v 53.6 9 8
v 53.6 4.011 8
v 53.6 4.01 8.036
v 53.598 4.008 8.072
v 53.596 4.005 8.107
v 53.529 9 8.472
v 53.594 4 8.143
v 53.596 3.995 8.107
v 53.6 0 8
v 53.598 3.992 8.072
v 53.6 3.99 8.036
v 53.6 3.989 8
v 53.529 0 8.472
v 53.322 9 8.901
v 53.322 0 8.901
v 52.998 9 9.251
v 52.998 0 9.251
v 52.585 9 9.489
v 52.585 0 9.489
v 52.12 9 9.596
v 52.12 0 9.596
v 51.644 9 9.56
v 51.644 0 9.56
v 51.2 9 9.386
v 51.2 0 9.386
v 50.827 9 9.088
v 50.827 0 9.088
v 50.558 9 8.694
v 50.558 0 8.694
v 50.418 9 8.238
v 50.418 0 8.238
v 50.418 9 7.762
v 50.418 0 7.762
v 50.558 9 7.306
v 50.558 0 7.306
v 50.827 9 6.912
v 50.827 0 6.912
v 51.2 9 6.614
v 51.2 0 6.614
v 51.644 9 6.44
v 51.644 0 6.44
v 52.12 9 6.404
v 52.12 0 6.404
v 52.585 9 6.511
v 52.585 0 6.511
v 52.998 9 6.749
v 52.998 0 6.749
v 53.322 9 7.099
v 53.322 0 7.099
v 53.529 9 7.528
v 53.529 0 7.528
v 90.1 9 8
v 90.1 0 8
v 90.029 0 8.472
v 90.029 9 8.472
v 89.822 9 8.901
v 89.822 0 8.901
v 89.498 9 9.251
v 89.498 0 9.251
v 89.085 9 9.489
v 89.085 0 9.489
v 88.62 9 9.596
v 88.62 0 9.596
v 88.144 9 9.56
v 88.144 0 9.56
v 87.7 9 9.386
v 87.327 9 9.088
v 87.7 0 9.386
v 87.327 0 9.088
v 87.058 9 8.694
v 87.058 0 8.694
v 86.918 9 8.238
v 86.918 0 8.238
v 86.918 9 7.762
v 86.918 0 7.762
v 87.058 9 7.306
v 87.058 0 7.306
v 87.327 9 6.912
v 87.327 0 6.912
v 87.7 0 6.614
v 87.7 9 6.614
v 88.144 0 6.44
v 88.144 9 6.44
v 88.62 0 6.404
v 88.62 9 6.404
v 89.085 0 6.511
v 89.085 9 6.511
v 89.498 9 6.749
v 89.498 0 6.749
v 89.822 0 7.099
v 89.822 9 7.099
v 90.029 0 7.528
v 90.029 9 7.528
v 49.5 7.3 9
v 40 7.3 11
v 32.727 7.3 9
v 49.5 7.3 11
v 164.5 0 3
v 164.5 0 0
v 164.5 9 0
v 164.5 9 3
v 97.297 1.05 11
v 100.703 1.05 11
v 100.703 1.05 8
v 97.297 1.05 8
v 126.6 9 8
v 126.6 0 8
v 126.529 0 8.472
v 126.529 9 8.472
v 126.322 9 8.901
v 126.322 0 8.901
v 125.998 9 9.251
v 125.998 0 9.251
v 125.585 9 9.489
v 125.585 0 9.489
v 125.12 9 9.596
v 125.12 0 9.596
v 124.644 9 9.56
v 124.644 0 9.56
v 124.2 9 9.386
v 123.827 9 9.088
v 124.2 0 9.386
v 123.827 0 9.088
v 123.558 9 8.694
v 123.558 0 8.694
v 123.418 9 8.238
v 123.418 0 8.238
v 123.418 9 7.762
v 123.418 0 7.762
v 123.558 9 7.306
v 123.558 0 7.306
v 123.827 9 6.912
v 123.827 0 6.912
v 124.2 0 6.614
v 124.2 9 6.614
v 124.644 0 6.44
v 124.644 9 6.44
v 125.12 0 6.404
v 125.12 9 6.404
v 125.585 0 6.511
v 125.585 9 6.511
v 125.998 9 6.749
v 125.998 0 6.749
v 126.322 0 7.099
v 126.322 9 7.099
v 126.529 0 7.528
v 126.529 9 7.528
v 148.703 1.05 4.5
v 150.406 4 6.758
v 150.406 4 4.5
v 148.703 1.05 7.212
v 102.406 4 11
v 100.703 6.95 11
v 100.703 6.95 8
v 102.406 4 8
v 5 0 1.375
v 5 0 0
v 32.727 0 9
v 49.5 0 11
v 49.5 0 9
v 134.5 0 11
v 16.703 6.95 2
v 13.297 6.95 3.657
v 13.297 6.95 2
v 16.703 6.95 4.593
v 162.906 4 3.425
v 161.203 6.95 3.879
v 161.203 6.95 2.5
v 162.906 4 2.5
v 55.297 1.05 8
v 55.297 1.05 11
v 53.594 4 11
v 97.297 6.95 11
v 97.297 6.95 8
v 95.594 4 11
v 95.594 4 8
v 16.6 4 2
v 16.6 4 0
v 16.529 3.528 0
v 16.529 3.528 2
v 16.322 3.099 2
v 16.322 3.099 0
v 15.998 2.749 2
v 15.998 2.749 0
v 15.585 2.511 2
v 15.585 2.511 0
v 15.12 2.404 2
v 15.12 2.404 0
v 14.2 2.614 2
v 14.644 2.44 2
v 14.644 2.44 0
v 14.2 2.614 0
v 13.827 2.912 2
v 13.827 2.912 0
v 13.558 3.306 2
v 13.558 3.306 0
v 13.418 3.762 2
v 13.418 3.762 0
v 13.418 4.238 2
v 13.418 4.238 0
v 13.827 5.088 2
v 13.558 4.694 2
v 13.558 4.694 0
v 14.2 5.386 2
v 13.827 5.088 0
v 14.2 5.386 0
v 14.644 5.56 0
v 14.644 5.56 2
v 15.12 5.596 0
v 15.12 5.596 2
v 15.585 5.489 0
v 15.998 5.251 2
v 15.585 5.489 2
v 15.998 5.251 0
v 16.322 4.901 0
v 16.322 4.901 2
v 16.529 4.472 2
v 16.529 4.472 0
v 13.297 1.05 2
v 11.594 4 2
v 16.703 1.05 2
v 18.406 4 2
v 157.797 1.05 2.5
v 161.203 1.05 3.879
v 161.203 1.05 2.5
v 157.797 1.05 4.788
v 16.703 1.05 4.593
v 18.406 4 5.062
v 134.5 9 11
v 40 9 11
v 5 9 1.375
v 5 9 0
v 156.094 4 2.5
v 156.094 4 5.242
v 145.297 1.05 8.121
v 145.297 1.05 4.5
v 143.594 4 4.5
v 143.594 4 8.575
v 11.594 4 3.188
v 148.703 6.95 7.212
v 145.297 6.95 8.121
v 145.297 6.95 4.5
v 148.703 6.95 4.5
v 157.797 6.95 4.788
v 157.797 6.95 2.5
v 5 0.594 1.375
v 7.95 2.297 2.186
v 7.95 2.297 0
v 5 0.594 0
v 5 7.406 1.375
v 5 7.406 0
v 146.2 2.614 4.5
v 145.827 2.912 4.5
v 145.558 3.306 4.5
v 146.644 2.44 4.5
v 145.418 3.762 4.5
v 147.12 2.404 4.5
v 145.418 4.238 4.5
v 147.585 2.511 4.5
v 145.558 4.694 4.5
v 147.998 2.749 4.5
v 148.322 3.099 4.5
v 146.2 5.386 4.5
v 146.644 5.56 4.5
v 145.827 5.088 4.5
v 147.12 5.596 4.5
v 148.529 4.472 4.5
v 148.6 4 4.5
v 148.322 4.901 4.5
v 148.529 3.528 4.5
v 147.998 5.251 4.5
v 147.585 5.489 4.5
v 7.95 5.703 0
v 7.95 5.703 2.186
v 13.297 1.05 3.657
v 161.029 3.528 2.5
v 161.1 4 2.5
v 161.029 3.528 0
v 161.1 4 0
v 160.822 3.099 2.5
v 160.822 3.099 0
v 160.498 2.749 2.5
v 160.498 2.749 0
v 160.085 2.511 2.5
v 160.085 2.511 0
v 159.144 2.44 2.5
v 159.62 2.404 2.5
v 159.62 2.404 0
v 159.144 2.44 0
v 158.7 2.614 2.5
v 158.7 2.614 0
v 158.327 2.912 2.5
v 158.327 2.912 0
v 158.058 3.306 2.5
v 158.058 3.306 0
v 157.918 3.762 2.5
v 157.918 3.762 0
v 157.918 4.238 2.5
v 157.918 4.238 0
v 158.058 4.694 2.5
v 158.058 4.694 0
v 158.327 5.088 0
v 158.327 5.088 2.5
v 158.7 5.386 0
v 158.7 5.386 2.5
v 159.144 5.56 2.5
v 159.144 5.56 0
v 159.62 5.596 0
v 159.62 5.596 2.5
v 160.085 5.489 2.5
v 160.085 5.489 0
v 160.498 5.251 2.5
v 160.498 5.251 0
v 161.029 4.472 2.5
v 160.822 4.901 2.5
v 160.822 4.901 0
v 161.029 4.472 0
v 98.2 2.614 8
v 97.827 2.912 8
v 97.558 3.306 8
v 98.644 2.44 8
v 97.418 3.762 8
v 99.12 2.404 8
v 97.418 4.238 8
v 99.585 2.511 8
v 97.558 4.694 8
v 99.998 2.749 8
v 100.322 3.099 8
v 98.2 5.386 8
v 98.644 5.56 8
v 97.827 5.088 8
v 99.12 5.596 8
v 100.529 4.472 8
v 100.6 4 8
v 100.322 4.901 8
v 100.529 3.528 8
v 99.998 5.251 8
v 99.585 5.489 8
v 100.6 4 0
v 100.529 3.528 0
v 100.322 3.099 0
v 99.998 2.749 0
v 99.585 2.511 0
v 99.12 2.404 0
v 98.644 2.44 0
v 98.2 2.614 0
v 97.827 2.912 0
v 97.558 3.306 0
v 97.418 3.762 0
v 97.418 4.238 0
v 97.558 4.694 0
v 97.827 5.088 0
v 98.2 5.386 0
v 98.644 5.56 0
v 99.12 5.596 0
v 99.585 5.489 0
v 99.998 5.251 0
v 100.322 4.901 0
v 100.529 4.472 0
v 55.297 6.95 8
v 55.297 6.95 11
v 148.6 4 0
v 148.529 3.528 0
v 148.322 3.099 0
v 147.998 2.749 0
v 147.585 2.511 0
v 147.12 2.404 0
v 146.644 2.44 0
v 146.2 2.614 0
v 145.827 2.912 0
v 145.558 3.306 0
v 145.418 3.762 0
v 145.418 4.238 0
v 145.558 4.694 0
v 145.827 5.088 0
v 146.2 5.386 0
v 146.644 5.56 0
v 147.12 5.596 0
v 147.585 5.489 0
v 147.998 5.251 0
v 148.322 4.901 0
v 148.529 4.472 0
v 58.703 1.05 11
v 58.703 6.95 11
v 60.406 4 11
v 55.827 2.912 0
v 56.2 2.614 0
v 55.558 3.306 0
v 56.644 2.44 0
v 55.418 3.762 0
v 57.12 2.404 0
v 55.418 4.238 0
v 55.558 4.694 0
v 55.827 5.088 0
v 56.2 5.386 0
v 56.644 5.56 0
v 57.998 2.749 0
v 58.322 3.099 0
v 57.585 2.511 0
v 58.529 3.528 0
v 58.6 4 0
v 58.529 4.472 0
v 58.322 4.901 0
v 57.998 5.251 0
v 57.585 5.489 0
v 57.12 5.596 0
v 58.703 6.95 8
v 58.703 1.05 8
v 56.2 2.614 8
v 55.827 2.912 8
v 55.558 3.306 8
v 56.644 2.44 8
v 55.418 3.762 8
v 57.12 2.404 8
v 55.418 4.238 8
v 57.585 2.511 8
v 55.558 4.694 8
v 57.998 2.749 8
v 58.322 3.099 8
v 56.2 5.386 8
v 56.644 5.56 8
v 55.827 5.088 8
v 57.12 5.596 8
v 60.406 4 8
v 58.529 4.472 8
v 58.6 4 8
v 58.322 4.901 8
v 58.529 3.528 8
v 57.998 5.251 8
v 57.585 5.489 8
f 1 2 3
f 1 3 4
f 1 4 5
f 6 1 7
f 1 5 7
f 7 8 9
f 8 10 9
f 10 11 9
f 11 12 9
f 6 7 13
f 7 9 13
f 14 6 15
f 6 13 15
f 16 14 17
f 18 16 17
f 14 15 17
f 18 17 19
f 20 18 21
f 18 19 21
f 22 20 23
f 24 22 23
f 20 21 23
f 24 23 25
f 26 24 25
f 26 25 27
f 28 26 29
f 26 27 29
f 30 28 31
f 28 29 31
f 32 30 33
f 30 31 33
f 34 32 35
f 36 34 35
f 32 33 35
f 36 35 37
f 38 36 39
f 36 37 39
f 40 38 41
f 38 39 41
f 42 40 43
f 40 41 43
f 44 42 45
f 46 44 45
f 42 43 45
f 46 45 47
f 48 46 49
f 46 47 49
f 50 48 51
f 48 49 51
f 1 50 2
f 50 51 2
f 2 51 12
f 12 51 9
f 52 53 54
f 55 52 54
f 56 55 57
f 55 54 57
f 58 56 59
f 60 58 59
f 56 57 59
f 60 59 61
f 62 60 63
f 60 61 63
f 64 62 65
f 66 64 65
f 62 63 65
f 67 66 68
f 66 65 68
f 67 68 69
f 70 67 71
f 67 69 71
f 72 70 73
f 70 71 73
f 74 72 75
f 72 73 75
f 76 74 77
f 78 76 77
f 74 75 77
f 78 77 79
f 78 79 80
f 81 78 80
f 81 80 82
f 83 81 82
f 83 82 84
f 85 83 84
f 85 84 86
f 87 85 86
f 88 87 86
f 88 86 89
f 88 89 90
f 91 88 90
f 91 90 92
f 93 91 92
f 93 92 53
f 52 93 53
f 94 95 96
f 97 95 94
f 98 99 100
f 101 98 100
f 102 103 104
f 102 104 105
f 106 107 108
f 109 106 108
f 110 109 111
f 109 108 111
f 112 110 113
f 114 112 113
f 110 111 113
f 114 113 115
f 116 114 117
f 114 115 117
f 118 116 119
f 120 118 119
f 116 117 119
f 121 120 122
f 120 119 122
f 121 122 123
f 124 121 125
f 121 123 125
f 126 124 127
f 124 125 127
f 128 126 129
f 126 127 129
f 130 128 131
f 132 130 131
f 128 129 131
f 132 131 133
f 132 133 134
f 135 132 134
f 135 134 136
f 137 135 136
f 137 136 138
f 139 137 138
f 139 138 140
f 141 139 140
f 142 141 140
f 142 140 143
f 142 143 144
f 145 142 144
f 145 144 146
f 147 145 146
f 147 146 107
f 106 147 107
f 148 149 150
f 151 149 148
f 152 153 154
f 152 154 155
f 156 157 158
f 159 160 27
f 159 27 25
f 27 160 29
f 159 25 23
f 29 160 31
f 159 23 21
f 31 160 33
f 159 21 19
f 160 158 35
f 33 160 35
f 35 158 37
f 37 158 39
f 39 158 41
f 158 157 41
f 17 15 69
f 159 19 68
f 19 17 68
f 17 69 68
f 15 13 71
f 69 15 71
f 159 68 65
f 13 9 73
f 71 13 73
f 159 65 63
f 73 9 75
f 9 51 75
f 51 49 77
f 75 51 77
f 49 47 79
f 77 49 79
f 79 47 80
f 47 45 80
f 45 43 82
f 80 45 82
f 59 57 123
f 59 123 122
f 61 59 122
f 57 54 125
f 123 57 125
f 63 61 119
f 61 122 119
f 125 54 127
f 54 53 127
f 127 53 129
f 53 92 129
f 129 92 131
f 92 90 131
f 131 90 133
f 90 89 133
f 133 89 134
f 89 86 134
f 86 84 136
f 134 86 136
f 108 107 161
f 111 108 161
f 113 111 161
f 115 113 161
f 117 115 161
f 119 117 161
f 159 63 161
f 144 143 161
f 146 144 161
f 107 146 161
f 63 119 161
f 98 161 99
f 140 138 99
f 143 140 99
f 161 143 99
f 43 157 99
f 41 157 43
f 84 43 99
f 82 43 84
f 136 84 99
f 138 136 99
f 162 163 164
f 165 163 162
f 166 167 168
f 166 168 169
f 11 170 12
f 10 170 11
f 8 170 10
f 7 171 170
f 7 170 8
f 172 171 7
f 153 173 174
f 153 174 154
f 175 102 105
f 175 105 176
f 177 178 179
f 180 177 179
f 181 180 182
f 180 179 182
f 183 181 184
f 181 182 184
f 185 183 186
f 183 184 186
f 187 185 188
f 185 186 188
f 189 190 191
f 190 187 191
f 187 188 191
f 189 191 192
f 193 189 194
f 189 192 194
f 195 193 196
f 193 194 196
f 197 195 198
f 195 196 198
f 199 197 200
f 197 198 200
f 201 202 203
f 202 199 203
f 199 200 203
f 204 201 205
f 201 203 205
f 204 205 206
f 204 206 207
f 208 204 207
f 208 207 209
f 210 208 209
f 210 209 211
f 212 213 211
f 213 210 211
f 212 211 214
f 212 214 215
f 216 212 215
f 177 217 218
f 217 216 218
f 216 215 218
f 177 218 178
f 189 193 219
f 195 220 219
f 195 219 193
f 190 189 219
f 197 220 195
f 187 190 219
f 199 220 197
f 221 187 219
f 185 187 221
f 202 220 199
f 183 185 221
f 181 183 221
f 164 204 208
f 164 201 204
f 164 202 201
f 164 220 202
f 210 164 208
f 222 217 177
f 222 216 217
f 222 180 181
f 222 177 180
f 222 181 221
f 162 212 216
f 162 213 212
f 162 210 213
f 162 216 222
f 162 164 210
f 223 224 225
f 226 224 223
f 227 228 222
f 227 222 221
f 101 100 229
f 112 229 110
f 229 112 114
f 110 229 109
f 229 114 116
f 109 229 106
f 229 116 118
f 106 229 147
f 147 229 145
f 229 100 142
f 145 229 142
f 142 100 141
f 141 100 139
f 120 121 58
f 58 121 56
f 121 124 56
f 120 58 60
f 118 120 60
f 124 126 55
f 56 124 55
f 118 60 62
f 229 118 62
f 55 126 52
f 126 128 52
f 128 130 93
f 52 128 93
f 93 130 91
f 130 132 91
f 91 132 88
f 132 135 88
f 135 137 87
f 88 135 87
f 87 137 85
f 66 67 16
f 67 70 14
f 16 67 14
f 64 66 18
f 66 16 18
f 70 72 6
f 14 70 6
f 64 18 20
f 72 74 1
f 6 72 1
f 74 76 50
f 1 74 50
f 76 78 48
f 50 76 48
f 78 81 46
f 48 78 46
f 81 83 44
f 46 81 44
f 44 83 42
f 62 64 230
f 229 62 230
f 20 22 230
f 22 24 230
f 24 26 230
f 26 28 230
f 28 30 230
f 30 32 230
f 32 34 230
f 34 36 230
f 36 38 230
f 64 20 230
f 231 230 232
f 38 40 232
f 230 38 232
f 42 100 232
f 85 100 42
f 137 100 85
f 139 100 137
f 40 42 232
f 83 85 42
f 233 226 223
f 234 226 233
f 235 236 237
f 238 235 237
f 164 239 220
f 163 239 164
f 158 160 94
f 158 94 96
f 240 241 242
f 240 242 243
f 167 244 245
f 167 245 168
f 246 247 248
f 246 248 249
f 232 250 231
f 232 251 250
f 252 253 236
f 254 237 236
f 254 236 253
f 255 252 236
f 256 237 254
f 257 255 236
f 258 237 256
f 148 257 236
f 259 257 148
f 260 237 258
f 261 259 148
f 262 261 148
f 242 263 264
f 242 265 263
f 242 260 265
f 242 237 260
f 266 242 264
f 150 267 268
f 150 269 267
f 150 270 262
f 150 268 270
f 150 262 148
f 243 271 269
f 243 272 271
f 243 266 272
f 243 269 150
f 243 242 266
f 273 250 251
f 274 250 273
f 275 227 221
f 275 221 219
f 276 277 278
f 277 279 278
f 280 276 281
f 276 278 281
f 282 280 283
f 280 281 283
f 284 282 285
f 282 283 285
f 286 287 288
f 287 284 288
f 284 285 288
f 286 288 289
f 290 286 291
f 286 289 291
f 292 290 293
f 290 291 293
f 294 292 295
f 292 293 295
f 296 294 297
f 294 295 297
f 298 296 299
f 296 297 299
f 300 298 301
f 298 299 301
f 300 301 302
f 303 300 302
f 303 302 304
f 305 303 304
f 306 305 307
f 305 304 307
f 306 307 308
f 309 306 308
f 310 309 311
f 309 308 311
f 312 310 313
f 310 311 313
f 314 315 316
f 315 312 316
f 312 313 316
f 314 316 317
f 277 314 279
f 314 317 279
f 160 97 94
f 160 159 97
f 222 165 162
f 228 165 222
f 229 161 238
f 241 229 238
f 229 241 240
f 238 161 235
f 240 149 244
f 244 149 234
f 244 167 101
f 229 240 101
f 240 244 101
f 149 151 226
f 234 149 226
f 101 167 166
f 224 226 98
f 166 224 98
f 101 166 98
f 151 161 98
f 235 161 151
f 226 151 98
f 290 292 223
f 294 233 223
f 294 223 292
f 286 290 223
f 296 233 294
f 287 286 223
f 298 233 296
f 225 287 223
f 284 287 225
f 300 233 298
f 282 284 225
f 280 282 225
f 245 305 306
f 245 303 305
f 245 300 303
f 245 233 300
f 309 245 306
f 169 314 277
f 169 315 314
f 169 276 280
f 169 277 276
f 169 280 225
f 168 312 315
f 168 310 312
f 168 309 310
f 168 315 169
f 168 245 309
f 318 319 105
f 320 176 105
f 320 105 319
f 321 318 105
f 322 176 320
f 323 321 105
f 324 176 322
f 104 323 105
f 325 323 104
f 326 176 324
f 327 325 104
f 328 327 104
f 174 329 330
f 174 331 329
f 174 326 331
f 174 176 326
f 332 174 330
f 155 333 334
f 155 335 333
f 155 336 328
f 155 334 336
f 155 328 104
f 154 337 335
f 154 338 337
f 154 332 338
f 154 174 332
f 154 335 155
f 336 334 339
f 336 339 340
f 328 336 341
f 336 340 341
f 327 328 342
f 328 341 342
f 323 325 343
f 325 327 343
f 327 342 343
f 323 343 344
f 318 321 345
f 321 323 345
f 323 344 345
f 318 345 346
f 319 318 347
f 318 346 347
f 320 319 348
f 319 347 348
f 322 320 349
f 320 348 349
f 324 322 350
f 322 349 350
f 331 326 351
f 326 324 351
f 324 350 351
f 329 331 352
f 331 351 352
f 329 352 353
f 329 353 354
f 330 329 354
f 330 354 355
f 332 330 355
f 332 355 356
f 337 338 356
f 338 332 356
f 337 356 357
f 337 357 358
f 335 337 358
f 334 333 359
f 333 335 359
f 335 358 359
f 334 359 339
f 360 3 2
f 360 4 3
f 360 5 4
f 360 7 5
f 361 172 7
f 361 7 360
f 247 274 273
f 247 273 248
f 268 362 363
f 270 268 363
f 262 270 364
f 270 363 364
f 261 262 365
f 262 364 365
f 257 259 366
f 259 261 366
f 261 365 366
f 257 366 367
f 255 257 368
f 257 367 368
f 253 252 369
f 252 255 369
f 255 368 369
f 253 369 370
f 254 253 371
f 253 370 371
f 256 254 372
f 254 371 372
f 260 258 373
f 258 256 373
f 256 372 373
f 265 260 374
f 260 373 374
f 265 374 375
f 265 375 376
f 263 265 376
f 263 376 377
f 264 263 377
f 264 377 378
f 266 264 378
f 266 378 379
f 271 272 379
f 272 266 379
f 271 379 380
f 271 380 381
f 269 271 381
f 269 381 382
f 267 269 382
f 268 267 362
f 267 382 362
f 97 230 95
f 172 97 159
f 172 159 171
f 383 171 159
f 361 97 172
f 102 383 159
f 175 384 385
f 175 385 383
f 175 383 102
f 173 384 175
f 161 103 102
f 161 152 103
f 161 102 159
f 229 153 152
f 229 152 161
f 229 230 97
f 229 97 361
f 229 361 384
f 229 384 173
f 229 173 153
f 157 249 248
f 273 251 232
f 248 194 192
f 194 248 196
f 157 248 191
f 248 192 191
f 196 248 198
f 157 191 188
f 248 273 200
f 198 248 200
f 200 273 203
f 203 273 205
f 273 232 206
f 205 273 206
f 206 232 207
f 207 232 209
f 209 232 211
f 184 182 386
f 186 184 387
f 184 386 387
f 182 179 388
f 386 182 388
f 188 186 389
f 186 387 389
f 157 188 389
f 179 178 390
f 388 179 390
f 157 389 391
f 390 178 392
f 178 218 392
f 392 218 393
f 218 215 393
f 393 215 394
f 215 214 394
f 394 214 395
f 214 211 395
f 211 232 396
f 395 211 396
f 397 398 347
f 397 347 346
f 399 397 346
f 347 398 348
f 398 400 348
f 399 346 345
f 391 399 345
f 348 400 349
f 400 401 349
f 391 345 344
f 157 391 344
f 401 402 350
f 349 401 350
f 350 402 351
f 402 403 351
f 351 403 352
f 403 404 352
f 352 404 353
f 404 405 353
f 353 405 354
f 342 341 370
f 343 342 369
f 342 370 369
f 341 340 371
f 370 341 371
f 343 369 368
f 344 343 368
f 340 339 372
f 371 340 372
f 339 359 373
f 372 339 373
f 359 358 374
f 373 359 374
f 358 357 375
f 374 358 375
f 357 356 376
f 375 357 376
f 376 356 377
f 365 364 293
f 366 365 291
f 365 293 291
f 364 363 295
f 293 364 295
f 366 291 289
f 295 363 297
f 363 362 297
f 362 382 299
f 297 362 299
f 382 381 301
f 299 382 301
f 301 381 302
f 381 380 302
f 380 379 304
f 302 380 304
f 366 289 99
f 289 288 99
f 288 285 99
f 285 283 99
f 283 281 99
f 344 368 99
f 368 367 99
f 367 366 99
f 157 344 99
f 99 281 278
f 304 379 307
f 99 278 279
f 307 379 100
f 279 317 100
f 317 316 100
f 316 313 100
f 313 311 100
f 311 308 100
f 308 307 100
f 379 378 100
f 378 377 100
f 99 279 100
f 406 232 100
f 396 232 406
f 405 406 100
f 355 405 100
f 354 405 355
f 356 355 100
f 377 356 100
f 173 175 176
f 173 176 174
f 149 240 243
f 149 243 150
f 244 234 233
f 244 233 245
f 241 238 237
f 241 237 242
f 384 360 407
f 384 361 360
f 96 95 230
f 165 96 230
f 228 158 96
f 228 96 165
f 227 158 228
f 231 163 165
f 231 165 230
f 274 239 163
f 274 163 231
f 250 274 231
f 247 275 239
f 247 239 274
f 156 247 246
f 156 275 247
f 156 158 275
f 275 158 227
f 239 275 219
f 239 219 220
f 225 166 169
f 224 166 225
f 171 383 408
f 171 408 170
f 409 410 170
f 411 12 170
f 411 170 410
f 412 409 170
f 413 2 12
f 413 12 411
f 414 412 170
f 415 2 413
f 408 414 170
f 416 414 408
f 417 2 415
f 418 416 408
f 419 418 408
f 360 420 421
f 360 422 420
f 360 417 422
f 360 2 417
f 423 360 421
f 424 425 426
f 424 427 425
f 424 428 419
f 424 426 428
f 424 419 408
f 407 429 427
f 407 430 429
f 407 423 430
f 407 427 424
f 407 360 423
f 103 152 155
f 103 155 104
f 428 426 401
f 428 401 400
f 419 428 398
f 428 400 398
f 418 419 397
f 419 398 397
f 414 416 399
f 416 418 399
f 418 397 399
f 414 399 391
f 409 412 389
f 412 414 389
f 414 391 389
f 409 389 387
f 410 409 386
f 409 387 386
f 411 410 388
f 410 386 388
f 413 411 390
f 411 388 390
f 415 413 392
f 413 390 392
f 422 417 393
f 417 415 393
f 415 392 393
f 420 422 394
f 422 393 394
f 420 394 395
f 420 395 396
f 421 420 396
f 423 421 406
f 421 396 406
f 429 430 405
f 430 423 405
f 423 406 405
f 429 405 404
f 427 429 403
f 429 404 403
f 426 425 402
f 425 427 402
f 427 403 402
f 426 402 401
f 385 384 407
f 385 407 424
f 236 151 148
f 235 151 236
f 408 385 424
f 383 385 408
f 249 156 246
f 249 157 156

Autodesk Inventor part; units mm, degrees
ref_plane "YZ Plane" through (0, 0, 0) normal (1, 0, 0) x (0, 1, 0)
ref_plane "XZ Plane" through (0, 0, 0) normal (0, 1, 0) x (-1, 0, 0)
ref_plane "XY Plane" through (0, 0, 0) normal (0, 0, 1) x (1, 0, 0)
sketch "Sketch1" plane through (0, 0, 0) normal (0, 0, 1) x (1, 0, 0)
  line L0 (0, 0) -> (164.5, 0)
  line L1 (164.5, 0) -> (164.5, 9)
  line L2 (164.5, 9) -> (0, 9)
  line L3 (0, 9) -> (0, 0)
  circle A0 centre (57, 4) radius 1.6
  circle A1 centre (99, 4) radius 1.6
  circle A2 centre (159.5, 4) radius 1.6
  circle A3 centre (147, 4) radius 1.6
  circle A4 centre (15, 4) radius 1.6
  circle A5 centre (5, 4) radius 1.6
  dimension "d1" = 9
  dimension "d2" = 90
  dimension "d4" = 3.2
  dimension "d6" = 3.2
  dimension "d7" = 3.2
  dimension "d8" = 42
  dimension "d9" = 60.5
  dimension "d26" = 3.2
  dimension "d27" = 48
  dimension "d28" = 3.2
  dimension "d29" = 42
  dimension "d32" = 15
  dimension "d33" = 5
  dimension "d61" = 3.2
  dimension "d62" = 10
  dimension "d63" = 12.5
  dimension "d108" = 4
  dimension "d109" = 4
  dimension "d110" = 4
  dimension "d111" = 4
  dimension "d112" = 4
  dimension "d113" = 4
ref_plane "Work Plane2" through (0, 0, 0) normal (0, -1, 0) x (1, 0, 0)
sketch "Sketch2" plane through (0, 0, 0) normal (0, -1, 0) x (1, 0, 0)
  circle A0 centre (52, 8) radius 1.6
  circle A1 centre (125, 8) radius 1.6
  circle A2 centre (88.5, 8) radius 1.6
  point P0 (0, 0)
  point P1 (52, 0)
  dimension "d13" = 3.2
  dimension "d15" = 3.2
  dimension "d17" = 3.2
  dimension "d18" = 36.5
  dimension "d64" = 52
  dimension "d65" = 36.5
  dimension "d114" = 8
  dimension "d115" = 73
ref_plane "Work Plane1" through (0, 0, 11) normal (0, 0, 1) x (1, 0, 0)
extrude "klocek" add sketch "Sketch1" along normal blind 11
ref_plane "Work Plane3" through (0, 0, 0) normal (0, -1, 0) x (1, 0, 0)
extrude "prowadzenie osi" cut sketch "Sketch2" against normal up to next
ref_plane "Work Plane4" through (0, 0, 0) normal (0, -1, 0) x (1, 0, 0)
sketch "Sketch7" plane through (0, 0, 0) normal (0, -1, 0) x (1, 0, 0)
  line L0 (0, 11) -> (0, 0)
  line L1 (0, 11) -> (164.5, 11) projected
  line L2 (0, 11) -> (40, 11)
  line L3 (40, 11) -> (0, 0)
  point P0 (0, -1.8333)
  dimension "d86" = 11
  dimension "d87" = 40
sketch "Sketch8" plane through (0, 0, 0) normal (0, -1, 0) x (1, 0, 0)
  line L0 (164.5, 0) -> (164.5, 11) projected
  line L1 (164.5, 11) -> (164.5, 3)
  line L2 (164.5, 11) -> (0, 11) projected
  line L3 (164.5, 11) -> (134.5, 11)
  line L4 (134.5, 11) -> (164.5, 3)
  point P0 (0, 0)
  point P1 (40.8333, 11)
  dimension "d80" = 8
  dimension "d81" = 30
extrude "przedni skos" cut sketch "Sketch7" against normal up to next
extrude "tylni skos" cut sketch "Sketch8" against normal up to next
ref_plane "Work Plane7" through (0, 0, 11) normal (0, 0, 1) x (1, 0, 0)
sketch "Sketch5" plane through (0, 0, 11) normal (0, 0, 1) x (1, 0, 0)
  circle A0 centre (99, 4) radius 1.6 projected
  line L0 (95.5936, 4) -> (97.2968, 6.95)
  line L1 (97.2968, 6.95) -> (100.7032, 6.95)
  line L2 (100.7032, 6.95) -> (102.4064, 4)
  line L3 (102.4064, 4) -> (100.7032, 1.05)
  line L4 (100.7032, 1.05) -> (97.2968, 1.05)
  line L5 (97.2968, 1.05) -> (95.5936, 4)
  circle A1 centre (57, 4) radius 1.6 projected
  line L6 (60.4064, 4) -> (58.7032, 1.05)
  line L7 (58.7032, 1.05) -> (55.2968, 1.05)
  line L8 (55.2968, 1.05) -> (53.5936, 4)
  line L9 (53.5936, 4) -> (55.2968, 6.95)
  line L10 (55.2968, 6.95) -> (58.7032, 6.95)
  line L11 (58.7032, 6.95) -> (60.4064, 4)
  point P0 (119.5, 5)
  dimension "d98" = 5.9
  dimension "d100" = 5.9
extrude "hex insert middle" cut sketch "Sketch5" against normal blind 3
ref_plane "Work Plane6" through (0, 0, 11) normal (0, 0, 1) x (1, 0, 0)
sketch "Sketch9" plane through (0, 0, 11) normal (0, 0, 1) x (1, 0, 0)
  circle A0 centre (147, 4) radius 1.6 projected
  line L0 (150.4064, 4) -> (148.7032, 1.05)
  line L1 (148.7032, 1.05) -> (145.2968, 1.05)
  line L2 (145.2968, 1.05) -> (143.5936, 4)
  line L3 (143.5936, 4) -> (145.2968, 6.95)
  line L4 (145.2968, 6.95) -> (148.7032, 6.95)
  line L5 (148.7032, 6.95) -> (150.4064, 4)
  point P0 (0, 0)
  point P1 (153, 5)
  dimension "d99" = 5.9
extrude "hex insert rear 1" cut sketch "Sketch9" against normal blind 6.5
ref_plane "Work Plane5" through (0, 0, 11) normal (0, 0, 1) x (1, 0, 0)
sketch "Sketch10" plane through (0, 0, 11) normal (0, 0, 1) x (1, 0, 0)
  circle A0 centre (159.5, 4) radius 1.6 projected
  line L0 (162.9064, 4) -> (161.2032, 1.05)
  line L1 (161.2032, 1.05) -> (157.7968, 1.05)
  line L2 (157.7968, 1.05) -> (156.0936, 4)
  line L3 (156.0936, 4) -> (157.7968, 6.95)
  line L4 (157.7968, 6.95) -> (161.2032, 6.95)
  line L5 (161.2032, 6.95) -> (162.9064, 4)
  point P0 (0, 0)
  dimension "d101" = 5.9
extrude "hex insert rear 2" cut sketch "Sketch10" against normal blind 8.5
sketch "Sketch13" plane through (0, 0, 11) normal (0, 0, 1) x (1, 0, 0)
  line L0 (197.4, 0) -> (-32.9, 0) projected
  line L1 (7.95, 2.2968) -> (5, 0.5936)
  line L2 (5, 0.5936) -> (2.05, 2.2968)
  line L3 (2.05, 2.2968) -> (2.05, 5.7032)
  line L4 (2.05, 5.7032) -> (5, 7.4064)
  line L5 (5, 7.4064) -> (7.95, 5.7032)
  line L6 (7.95, 5.7032) -> (7.95, 2.2968)
  point P0 (0, 0)
  point P1 (5, 4)
  point P2 (5, 4)
  dimension "d117" = 5.9
extrude "hex insert front 1" cut sketch "Sketch13" against normal through all
sketch "Sketch16" plane through (0, 0, 11) normal (0, 0, 1) x (1, 0, 0)
  circle A0 centre (15, 4) radius 1.6 projected
  line L0 (18.4064, 4) -> (16.7032, 1.05)
  line L1 (16.7032, 1.05) -> (13.2968, 1.05)
  line L2 (13.2968, 1.05) -> (11.5936, 4)
  line L3 (11.5936, 4) -> (13.2968, 6.95)
  line L4 (13.2968, 6.95) -> (16.7032, 6.95)
  line L5 (16.7032, 6.95) -> (18.4064, 4)
  point P0 (0, 0)
  dimension "d93" = 5.9
extrude "hex insert front 2" cut sketch "Sketch16" against normal blind 9
sketch "Sketch17" plane through (0, 0, 0) normal (0, 0, -1) x (-1, 0, 0)
  line L0 (0, 9) -> (0, 0) projected
  line L1 (0, 0) -> (-5, 0)
  line L2 (-5, 0) -> (-5, 10.0042)
  line L3 (-5, 10.0042) -> (0, 10.0042)
  line L4 (0, 10.0042) -> (0, 0)
  point P0 (-5, 7.4064)
extrude "Extrusion20" cut sketch "Sketch17" against normal up to next
sketch "Sketch18" plane through (40, 0, 11) normal (0, -1, 0) x (1, 0, 0)
  line L0 (9.5, 0) -> (9.5, -2)
  line L1 (9.5, -2) -> (-7.5, -2)
  line L2 (-7.5, -2) -> (-7.5, 0)
  line L3 (-7.5, 0) -> (9.5, 0)
  line L4 (94.5, 0) -> (0, 0) projected
  circle A0 centre (12, -3) radius 1.6 projected
  line L5 (-35, -11) -> (124.5, -11) projected
  point P0 (-40, -11)
  dimension "d102" = 2
  dimension "d103" = 17
  dimension "d104" = 2.5
extrude "Extrusion21" cut sketch "Sketch18" against normal blind 7.3 contours L0 L1 L2 L3
properties part number "wheel_support_v3_narrow_with_line_sensor_all_holes"
